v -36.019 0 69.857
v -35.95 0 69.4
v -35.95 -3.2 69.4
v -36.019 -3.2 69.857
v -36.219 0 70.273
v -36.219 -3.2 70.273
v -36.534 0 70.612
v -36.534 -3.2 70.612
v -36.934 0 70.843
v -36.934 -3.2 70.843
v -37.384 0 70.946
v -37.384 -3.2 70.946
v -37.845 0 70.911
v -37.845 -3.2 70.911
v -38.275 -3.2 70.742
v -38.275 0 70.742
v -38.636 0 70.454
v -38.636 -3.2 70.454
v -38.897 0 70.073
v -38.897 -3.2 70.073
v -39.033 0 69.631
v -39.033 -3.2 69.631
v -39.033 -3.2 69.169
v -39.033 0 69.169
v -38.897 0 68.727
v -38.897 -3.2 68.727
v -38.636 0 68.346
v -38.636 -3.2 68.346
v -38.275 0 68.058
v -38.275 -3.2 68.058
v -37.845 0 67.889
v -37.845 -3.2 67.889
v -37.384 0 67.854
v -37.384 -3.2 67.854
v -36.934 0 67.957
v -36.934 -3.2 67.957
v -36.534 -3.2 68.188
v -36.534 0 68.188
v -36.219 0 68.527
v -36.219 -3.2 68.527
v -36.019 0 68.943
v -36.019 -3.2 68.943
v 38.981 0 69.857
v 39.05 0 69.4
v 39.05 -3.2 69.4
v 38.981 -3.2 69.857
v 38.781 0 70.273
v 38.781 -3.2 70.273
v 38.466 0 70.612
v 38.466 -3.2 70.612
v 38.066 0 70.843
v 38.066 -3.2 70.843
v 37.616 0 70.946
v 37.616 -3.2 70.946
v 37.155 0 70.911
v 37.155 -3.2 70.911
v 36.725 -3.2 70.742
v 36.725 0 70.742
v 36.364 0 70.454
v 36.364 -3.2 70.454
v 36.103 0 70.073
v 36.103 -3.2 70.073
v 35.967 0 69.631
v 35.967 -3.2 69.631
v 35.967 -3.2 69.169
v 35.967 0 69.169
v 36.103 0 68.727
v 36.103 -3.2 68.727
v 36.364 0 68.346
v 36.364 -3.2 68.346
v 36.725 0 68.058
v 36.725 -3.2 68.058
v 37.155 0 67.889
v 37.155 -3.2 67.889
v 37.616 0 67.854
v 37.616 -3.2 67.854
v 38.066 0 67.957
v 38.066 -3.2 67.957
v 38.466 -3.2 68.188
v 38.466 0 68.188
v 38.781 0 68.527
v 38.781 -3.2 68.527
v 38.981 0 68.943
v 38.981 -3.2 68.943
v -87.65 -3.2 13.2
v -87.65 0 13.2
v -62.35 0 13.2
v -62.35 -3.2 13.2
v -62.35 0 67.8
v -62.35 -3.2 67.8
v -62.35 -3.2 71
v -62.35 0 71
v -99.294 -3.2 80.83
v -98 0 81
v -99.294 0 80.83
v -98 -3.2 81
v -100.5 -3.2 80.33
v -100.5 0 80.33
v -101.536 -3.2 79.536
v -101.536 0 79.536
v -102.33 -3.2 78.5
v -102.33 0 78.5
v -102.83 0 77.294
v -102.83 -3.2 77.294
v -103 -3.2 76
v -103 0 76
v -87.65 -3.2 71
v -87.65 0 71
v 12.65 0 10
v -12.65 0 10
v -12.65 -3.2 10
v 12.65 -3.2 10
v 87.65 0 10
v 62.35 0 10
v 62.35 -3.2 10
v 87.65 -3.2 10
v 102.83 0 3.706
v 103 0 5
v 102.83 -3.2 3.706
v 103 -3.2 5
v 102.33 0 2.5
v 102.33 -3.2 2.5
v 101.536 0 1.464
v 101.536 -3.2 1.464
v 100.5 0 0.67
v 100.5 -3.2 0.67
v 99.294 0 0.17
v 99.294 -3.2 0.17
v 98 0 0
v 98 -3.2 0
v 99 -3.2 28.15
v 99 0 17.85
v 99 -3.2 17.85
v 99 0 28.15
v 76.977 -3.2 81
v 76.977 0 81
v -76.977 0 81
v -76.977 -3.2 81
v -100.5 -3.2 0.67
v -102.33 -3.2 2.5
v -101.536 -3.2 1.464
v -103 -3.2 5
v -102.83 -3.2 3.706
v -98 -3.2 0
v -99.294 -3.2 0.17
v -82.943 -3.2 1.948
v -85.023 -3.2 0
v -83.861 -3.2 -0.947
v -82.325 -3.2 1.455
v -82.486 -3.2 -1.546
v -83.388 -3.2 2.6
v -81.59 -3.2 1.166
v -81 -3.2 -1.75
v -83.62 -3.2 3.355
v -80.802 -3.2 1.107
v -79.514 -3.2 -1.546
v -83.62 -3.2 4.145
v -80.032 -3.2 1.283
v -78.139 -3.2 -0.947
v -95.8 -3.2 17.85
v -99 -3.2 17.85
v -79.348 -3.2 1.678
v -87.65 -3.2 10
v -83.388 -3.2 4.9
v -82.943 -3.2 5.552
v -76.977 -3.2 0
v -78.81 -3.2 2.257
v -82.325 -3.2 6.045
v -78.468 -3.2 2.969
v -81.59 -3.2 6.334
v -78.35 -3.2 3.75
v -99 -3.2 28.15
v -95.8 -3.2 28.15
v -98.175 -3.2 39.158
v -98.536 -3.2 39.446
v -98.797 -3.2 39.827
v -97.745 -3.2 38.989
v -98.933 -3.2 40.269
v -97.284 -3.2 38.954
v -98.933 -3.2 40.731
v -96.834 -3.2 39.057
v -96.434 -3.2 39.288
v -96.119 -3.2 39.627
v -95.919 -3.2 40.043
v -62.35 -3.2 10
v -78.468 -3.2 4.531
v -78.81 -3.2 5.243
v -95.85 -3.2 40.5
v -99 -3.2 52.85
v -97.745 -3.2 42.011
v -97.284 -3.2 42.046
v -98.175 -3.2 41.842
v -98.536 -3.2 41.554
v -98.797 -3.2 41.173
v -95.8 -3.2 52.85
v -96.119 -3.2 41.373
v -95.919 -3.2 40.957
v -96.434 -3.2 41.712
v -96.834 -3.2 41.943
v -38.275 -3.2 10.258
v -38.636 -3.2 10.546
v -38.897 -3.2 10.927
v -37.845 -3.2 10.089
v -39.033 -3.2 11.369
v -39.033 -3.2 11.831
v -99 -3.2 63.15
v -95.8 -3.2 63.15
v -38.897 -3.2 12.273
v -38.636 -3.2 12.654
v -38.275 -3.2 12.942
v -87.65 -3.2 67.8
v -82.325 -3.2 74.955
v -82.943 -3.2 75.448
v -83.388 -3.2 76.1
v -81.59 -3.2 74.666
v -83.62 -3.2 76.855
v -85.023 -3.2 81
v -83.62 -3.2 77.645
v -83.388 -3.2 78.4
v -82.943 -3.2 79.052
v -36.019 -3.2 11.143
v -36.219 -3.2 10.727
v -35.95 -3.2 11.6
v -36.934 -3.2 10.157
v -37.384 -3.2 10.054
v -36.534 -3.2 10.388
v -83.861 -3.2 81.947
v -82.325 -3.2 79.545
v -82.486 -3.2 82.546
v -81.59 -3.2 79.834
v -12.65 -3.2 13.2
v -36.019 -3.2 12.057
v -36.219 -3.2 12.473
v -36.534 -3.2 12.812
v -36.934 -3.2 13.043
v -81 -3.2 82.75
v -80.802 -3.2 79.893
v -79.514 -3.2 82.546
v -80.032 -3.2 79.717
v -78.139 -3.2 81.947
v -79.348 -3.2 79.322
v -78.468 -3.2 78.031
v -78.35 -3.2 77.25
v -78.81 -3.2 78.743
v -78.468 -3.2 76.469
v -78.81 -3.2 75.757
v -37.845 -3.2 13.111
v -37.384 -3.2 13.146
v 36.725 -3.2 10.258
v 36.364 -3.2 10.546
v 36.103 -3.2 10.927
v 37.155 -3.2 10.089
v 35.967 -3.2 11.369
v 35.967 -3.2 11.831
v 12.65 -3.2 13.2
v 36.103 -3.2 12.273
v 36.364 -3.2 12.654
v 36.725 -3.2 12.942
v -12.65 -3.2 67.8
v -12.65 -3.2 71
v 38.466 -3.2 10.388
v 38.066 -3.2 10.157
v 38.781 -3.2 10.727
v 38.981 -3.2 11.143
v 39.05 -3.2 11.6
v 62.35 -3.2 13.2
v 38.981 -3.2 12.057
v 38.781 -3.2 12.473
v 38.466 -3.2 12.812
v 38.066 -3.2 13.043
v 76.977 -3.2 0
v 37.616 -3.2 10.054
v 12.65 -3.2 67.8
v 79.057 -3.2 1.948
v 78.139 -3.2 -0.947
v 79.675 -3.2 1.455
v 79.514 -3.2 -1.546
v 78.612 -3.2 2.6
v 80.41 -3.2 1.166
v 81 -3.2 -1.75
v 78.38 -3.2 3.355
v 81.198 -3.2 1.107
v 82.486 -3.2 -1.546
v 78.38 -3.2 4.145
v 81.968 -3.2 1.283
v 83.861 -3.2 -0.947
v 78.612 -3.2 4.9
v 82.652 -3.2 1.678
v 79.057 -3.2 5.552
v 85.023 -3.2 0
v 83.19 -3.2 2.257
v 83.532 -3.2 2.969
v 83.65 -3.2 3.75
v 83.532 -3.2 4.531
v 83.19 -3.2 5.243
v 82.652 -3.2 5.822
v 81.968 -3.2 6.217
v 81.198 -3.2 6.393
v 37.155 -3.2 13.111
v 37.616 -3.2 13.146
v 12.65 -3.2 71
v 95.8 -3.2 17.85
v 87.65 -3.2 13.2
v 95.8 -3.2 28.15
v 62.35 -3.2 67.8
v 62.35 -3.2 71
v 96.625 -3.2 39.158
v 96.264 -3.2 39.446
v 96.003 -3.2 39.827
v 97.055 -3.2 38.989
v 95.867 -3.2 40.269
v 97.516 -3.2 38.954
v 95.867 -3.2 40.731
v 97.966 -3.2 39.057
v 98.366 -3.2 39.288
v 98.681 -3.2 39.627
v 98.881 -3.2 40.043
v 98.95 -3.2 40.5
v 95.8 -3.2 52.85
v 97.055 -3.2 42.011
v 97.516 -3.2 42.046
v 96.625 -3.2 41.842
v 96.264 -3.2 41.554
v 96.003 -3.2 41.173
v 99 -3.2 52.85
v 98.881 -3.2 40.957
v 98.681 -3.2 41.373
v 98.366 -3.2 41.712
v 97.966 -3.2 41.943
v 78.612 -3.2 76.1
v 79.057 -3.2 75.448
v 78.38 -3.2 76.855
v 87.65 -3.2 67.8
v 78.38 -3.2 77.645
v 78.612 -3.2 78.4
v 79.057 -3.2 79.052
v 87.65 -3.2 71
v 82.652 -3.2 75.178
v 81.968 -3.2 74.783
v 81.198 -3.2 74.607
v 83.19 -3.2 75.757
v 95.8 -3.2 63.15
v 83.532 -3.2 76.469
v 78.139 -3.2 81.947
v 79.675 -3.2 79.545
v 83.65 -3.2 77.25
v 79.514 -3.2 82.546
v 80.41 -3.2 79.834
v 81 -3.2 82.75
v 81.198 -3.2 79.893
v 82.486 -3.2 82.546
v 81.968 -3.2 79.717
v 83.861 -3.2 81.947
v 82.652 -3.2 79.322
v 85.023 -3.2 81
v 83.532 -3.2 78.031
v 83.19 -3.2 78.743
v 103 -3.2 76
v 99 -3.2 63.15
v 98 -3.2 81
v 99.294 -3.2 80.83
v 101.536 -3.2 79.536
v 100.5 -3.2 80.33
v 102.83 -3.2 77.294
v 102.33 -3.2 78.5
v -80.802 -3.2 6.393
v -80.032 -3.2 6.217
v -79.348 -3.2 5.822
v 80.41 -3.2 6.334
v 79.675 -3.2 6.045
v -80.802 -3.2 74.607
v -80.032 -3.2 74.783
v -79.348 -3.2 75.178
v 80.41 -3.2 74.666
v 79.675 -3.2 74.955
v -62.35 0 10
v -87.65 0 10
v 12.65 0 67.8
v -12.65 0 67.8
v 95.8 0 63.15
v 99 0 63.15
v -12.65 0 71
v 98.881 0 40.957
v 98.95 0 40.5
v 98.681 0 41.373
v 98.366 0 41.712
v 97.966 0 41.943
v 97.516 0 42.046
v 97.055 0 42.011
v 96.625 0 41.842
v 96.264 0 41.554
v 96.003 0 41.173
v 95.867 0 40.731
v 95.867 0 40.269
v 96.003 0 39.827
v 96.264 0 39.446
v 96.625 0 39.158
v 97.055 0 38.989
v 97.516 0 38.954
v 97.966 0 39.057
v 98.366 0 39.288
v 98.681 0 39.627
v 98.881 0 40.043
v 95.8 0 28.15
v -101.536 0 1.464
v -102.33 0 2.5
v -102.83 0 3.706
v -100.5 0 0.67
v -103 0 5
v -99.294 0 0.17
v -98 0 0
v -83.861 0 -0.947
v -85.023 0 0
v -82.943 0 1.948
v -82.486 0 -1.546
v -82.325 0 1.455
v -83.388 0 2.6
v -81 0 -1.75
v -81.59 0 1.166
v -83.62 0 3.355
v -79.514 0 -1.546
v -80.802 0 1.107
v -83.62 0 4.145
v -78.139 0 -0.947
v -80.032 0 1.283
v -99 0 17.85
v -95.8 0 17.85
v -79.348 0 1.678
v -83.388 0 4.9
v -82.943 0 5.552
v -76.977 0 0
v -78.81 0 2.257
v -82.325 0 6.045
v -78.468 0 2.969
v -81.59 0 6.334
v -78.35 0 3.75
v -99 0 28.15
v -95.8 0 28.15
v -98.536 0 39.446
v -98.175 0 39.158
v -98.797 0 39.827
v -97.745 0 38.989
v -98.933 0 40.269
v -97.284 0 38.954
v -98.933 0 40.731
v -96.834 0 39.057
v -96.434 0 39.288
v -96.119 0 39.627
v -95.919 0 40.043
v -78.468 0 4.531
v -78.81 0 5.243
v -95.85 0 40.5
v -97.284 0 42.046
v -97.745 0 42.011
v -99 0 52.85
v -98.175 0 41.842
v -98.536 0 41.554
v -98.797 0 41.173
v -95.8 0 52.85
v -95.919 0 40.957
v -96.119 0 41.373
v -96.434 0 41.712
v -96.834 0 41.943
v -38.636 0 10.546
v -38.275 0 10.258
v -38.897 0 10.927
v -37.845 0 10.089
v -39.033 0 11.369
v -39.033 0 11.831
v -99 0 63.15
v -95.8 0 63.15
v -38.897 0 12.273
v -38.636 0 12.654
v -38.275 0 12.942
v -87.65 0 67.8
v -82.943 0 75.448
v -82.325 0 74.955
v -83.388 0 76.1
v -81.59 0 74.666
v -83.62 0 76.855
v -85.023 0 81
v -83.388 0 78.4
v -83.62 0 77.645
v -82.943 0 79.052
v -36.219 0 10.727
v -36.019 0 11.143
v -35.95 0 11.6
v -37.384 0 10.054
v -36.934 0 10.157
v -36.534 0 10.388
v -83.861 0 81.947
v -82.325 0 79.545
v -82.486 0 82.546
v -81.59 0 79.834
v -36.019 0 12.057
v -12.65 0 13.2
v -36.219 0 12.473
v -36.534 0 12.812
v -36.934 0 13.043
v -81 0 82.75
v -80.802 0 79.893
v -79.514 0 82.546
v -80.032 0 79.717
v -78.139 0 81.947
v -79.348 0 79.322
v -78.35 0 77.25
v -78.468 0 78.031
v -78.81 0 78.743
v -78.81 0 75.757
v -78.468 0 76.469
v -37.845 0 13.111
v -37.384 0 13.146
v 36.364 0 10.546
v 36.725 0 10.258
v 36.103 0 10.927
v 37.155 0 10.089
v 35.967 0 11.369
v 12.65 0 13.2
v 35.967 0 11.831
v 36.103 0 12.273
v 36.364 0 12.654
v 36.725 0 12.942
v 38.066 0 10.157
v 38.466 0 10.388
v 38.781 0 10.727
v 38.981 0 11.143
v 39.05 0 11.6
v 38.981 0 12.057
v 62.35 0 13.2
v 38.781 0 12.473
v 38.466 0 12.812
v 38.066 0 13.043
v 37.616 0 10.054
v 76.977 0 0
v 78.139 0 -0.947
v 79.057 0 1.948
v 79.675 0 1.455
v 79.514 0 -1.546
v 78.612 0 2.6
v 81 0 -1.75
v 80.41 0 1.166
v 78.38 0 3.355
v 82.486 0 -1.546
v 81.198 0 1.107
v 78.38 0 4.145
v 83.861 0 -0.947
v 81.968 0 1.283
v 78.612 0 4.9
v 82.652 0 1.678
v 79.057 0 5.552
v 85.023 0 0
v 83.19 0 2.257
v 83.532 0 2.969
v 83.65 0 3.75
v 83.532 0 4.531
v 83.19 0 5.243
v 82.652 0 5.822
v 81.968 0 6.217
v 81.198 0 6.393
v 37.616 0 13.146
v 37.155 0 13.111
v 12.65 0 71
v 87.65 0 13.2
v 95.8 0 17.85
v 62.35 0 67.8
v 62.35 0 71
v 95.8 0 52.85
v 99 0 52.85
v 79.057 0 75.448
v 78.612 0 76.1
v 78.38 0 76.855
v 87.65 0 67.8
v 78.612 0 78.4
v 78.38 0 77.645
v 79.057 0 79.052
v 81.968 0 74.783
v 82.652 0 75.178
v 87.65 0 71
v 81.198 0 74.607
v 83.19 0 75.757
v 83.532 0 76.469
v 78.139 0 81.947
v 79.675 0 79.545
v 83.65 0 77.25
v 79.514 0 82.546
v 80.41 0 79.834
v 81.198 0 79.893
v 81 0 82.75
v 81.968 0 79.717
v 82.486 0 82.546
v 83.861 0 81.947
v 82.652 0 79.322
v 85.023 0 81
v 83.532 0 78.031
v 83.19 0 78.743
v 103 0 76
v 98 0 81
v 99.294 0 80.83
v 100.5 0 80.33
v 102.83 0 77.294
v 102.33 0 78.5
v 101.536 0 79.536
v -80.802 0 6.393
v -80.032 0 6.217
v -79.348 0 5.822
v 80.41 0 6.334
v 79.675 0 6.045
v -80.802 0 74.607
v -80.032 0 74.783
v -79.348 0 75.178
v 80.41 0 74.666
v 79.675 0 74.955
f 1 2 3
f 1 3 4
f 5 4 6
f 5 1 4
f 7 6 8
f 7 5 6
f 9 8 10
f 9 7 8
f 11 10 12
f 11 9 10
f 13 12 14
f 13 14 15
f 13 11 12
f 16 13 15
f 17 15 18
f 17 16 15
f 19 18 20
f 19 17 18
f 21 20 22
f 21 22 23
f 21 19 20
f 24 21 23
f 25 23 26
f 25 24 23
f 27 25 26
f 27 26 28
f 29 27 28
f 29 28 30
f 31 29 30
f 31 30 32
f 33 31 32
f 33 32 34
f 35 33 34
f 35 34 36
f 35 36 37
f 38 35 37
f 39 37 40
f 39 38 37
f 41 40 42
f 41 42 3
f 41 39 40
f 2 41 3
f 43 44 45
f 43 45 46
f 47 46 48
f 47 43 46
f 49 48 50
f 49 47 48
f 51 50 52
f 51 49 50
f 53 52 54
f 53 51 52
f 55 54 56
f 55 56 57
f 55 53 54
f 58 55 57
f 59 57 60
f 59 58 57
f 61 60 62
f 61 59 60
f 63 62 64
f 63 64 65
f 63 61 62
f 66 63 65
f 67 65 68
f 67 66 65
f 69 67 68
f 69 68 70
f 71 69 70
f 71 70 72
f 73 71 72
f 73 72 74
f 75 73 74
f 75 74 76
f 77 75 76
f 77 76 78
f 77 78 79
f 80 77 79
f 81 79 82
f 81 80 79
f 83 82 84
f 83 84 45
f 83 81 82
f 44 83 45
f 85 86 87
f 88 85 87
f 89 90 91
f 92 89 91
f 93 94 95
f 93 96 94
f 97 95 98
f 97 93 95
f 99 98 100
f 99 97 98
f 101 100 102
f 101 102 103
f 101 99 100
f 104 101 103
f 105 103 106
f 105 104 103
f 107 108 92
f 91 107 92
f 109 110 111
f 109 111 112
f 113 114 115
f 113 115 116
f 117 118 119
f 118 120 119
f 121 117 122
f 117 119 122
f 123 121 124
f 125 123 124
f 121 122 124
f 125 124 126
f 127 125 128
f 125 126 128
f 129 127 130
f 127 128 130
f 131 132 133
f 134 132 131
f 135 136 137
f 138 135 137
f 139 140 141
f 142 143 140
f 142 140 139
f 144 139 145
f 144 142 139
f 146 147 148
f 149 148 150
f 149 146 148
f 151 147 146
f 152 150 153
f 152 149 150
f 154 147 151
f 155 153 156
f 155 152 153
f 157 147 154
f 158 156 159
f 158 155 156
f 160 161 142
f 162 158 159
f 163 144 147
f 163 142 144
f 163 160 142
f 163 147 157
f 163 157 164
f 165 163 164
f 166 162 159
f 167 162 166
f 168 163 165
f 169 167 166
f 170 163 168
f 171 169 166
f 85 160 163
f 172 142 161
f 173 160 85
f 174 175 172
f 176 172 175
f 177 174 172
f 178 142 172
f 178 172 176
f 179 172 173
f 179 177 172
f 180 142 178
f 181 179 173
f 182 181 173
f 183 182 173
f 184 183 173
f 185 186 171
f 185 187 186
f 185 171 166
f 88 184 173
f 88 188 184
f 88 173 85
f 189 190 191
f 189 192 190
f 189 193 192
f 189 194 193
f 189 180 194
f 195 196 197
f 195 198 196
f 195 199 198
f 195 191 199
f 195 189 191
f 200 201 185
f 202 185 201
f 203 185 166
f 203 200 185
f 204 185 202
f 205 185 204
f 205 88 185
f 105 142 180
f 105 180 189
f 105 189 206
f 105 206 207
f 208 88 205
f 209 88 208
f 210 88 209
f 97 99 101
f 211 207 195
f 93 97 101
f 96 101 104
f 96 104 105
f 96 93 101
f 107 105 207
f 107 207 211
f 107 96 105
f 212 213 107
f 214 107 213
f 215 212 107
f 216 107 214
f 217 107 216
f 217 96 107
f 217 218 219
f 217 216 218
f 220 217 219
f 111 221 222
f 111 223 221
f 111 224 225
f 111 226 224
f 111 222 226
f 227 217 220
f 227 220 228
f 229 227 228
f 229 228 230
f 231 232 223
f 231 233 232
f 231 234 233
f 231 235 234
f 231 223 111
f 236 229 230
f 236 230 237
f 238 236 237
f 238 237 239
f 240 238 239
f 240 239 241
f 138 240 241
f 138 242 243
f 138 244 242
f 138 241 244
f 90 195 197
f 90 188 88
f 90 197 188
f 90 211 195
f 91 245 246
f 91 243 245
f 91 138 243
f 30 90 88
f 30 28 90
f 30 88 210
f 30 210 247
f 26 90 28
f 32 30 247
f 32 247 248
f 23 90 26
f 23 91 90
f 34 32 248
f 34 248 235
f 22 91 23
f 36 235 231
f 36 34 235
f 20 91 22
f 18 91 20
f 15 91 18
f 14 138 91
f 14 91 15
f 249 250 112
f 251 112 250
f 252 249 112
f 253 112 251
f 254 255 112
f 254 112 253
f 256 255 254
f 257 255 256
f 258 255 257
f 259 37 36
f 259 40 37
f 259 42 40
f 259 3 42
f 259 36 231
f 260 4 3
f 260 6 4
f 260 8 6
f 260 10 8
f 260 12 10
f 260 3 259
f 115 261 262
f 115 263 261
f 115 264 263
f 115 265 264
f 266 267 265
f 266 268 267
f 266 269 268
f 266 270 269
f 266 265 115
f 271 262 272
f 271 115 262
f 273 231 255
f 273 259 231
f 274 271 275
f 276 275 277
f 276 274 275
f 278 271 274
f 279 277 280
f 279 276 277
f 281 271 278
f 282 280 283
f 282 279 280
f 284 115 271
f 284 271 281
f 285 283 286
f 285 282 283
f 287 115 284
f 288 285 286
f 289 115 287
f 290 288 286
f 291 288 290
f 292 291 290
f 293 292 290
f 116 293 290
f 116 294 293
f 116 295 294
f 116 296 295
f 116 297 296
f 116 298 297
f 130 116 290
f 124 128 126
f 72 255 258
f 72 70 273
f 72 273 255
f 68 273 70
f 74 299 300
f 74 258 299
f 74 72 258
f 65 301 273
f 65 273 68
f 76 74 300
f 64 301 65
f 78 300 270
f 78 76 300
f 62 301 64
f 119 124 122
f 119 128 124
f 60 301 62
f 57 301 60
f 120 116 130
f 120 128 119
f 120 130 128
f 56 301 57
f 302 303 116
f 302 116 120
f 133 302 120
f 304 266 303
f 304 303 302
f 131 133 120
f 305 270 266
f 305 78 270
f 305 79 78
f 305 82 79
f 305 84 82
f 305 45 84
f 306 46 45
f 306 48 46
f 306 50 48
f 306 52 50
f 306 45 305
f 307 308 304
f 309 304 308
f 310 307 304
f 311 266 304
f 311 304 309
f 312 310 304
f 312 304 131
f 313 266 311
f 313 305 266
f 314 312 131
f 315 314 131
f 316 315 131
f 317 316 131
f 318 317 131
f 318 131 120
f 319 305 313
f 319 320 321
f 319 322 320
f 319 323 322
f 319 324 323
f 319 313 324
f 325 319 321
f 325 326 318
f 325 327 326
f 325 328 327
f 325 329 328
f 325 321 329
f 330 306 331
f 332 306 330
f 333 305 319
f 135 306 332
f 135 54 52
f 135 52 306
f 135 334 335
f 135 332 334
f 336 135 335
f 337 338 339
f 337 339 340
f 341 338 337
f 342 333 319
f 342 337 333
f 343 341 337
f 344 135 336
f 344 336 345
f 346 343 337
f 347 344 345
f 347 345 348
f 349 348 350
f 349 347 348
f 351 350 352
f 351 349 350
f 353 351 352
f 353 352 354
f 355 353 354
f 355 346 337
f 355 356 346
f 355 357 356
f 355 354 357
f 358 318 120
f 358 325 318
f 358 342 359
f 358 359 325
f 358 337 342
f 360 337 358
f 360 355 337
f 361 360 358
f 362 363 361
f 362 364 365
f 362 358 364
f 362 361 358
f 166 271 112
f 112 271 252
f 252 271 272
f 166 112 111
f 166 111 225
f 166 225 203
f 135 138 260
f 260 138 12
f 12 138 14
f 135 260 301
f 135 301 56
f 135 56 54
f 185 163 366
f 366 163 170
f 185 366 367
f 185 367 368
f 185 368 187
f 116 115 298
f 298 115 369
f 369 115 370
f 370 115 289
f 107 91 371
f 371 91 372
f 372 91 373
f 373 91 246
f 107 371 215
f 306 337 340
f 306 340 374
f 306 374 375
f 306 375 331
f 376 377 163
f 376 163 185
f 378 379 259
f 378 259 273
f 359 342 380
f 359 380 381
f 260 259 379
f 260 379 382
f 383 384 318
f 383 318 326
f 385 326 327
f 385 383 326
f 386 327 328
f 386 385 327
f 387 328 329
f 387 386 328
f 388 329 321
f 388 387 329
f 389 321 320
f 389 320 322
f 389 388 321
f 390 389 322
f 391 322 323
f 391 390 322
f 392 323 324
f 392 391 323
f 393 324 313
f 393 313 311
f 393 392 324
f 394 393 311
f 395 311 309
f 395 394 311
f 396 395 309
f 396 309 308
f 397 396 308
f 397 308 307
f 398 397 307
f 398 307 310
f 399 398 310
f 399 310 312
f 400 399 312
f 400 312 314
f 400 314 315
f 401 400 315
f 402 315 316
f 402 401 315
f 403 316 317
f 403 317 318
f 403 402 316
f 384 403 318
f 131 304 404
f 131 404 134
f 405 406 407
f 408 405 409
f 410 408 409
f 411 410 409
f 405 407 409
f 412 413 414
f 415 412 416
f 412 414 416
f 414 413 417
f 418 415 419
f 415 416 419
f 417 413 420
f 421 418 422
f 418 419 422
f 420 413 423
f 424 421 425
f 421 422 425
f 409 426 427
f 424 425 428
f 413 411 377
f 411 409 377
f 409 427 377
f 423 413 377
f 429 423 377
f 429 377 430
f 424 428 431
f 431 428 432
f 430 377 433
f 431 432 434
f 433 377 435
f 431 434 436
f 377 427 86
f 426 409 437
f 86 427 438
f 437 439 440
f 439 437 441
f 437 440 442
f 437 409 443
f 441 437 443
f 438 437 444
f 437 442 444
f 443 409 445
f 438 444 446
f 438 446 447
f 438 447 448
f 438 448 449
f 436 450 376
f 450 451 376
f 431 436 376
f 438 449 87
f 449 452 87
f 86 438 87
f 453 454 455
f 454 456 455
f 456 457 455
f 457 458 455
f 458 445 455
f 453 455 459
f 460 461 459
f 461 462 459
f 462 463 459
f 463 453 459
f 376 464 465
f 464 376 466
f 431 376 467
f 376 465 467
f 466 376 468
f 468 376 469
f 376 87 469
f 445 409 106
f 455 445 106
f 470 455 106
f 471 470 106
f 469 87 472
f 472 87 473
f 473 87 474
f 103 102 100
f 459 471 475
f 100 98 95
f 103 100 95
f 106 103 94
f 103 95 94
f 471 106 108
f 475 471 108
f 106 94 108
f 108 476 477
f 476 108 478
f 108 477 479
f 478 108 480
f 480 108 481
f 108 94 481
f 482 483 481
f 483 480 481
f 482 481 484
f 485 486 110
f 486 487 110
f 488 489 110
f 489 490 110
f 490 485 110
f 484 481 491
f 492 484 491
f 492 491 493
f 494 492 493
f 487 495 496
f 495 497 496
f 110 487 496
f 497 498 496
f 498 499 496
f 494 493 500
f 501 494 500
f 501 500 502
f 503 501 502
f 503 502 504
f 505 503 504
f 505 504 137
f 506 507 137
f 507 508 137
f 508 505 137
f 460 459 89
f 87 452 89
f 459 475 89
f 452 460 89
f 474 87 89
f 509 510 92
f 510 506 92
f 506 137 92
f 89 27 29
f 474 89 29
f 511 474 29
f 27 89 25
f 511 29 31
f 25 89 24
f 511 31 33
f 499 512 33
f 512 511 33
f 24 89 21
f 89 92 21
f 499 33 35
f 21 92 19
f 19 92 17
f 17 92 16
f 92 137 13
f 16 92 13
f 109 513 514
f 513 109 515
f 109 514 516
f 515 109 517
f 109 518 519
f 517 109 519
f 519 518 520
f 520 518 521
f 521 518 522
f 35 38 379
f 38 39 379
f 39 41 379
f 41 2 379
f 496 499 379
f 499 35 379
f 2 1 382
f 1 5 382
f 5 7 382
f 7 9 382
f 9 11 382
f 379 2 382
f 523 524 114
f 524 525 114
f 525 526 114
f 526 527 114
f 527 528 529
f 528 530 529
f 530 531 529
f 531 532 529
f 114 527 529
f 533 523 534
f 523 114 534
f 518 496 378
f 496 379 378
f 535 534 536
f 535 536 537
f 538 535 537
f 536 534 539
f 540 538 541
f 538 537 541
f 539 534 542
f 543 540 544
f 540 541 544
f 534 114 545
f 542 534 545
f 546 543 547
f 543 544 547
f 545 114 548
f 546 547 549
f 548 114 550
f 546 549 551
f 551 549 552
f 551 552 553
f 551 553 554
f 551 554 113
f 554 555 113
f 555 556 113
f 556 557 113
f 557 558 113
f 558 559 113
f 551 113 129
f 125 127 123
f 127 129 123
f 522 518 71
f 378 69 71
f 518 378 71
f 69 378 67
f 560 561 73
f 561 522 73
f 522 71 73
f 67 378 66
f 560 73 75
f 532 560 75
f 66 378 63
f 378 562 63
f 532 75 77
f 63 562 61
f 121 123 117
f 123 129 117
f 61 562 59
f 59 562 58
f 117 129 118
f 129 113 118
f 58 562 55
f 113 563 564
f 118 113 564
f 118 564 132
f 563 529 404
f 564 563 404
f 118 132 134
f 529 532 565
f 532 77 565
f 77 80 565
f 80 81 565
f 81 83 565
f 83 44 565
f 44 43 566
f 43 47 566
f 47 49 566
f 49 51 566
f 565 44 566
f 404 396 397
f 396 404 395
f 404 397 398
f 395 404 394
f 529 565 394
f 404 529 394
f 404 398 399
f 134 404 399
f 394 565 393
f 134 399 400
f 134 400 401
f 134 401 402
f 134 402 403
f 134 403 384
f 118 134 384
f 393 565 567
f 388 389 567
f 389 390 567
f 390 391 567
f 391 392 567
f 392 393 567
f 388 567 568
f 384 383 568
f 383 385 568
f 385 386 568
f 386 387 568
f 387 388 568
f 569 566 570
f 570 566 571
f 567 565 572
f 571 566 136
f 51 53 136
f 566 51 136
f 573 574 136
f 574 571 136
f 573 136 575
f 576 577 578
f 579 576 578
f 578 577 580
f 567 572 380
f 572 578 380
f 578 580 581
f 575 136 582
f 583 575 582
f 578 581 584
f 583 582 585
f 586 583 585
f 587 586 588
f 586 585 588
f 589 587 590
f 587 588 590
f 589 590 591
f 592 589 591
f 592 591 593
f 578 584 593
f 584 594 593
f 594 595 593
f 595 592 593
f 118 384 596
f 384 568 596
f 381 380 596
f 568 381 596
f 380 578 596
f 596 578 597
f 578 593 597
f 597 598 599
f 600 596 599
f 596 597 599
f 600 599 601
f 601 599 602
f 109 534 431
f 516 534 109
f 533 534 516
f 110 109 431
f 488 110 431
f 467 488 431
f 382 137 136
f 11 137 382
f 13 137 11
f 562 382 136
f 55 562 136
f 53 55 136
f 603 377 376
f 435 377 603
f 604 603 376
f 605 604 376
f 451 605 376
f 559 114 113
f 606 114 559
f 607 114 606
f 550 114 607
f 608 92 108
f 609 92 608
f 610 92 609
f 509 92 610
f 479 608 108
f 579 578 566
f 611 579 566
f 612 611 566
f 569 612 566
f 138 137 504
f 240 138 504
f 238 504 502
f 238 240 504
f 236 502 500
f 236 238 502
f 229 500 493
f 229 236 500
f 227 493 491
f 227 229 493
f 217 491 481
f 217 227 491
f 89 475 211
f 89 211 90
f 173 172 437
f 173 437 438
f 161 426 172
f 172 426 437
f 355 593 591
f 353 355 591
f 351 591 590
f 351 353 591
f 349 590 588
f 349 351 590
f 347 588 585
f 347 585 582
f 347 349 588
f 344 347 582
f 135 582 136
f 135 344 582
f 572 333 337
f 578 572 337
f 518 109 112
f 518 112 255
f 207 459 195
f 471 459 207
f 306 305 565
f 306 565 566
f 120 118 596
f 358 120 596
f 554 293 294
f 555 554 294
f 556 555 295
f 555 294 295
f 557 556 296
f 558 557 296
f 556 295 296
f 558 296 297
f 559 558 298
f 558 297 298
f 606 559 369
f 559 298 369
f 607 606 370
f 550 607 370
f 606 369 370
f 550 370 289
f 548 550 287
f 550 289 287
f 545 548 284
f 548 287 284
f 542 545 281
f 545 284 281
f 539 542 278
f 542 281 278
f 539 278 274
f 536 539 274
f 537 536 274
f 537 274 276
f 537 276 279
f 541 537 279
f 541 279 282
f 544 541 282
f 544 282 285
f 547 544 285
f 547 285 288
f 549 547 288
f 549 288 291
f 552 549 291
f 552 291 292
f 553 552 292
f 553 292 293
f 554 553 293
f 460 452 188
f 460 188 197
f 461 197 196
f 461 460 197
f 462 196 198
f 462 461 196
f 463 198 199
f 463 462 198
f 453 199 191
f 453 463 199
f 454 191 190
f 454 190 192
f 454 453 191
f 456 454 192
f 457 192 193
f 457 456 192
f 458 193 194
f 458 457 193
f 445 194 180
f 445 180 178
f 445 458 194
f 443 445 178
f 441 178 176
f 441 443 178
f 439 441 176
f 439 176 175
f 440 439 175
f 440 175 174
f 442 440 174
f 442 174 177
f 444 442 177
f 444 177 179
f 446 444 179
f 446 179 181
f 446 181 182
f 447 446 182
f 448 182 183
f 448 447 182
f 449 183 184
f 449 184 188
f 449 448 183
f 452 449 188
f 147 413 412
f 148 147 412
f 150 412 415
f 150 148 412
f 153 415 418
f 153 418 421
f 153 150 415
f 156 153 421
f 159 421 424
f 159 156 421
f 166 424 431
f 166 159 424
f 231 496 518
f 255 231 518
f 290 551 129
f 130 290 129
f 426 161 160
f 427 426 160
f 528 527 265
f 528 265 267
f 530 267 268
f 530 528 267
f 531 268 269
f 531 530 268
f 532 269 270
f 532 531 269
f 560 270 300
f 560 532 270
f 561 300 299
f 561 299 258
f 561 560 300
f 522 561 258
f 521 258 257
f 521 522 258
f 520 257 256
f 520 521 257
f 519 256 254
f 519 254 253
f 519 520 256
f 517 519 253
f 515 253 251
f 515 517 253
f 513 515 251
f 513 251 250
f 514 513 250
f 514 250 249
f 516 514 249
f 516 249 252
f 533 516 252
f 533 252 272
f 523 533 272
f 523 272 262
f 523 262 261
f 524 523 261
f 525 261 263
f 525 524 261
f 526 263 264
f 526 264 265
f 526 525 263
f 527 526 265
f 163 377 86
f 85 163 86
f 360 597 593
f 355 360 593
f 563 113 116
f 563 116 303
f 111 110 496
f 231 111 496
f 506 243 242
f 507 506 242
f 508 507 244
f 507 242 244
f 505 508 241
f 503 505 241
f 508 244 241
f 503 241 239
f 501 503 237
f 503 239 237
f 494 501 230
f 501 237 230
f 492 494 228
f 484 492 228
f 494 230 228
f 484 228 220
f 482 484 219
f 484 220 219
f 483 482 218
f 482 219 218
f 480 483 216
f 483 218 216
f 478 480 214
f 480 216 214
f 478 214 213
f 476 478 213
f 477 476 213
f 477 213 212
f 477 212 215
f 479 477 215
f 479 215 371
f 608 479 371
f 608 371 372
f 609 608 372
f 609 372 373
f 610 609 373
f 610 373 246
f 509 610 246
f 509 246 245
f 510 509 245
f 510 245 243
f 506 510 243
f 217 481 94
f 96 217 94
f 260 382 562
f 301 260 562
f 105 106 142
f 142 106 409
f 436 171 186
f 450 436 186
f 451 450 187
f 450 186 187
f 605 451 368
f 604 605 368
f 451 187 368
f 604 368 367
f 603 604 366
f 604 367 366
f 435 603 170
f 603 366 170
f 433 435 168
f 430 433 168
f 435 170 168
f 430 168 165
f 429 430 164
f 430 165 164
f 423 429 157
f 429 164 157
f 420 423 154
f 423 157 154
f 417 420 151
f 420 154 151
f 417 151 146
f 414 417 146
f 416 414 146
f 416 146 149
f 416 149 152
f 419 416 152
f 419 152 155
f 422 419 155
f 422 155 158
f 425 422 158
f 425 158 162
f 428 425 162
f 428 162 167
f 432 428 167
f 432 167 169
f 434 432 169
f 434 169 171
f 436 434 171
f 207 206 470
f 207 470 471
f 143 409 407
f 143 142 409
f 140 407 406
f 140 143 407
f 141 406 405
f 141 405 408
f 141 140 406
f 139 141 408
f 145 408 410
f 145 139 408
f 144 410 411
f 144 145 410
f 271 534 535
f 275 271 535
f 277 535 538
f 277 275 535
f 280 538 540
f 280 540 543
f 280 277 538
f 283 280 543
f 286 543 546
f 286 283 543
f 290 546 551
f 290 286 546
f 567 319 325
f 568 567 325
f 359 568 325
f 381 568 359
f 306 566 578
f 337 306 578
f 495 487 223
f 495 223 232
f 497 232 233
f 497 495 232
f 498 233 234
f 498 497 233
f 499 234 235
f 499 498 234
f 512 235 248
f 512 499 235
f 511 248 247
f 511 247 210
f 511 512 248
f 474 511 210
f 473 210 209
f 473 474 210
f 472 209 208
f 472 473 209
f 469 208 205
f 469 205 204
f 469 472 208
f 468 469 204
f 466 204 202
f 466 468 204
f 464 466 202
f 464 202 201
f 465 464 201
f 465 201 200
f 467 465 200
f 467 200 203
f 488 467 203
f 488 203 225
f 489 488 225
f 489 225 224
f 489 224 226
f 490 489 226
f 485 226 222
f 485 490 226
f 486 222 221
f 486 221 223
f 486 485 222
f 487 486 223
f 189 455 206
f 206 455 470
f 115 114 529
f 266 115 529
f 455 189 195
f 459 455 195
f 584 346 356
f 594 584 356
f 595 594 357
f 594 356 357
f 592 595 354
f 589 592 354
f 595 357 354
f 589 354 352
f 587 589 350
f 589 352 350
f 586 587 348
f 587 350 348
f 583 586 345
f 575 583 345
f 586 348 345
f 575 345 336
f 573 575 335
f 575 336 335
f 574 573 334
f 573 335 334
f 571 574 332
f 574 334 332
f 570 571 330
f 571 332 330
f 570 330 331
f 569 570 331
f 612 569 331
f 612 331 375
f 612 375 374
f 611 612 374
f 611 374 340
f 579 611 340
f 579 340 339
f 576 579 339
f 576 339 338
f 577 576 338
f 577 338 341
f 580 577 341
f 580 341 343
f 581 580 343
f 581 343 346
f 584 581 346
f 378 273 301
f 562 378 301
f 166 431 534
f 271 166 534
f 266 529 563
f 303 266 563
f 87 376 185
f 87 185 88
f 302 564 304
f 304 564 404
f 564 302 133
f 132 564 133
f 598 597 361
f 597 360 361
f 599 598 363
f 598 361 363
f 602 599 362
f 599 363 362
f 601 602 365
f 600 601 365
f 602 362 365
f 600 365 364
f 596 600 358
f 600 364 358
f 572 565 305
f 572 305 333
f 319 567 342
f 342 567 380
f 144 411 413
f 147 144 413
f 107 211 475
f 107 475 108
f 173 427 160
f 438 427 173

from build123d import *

# Parameters (mm, degrees)
F1_W     = 25.3
F1_H     = 3.2
F1_R     = 1.55
F1_W_2   = 3.2
F1_H_2   = 10.3
F2_DEPTH = 3.2
F4_R     = 5.5
F5_DEPTH = 3.2
F3_R     = 2.65
F6_DEPTH = 3.201
F7_R     = 5


with BuildPart() as f2:
    # F1 (on Front) → F2 (new body)
    with BuildSketch(Plane.XZ):
        Polygon((-99, 81), (-103, 81), (-103, 0), (-99, 0), (99, 0), (103, 0), (103, 81), (99, 81), align=None)
        with Locations((-75, 11.6)):
            Rectangle(F1_W, F1_H, mode=Mode.SUBTRACT)
        with Locations((-37.5, 11.6)):
            Circle(F1_R, mode=Mode.SUBTRACT)
        with Locations((0, 11.6)):
            Rectangle(F1_W, F1_H, mode=Mode.SUBTRACT)
        with Locations((-97.4, 23)):
            Rectangle(F1_W_2, F1_H_2, mode=Mode.SUBTRACT)
        with Locations((37.5, 11.6)):
            Circle(F1_R, mode=Mode.SUBTRACT)
        with Locations((75, 11.6)):
            Rectangle(F1_W, F1_H, mode=Mode.SUBTRACT)
        with Locations((97.4, 23)):
            Rectangle(F1_W_2, F1_H_2, mode=Mode.SUBTRACT)
        with Locations((-97.4, 40.5)):
            Circle(F1_R, mode=Mode.SUBTRACT)
        with Locations((-97.4, 58)):
            Rectangle(F1_W_2, F1_H_2, mode=Mode.SUBTRACT)
        with Locations((-75, 69.4)):
            Rectangle(F1_W, F1_H, mode=Mode.SUBTRACT)
        with Locations((-37.5, 69.4)):
            Circle(F1_R, mode=Mode.SUBTRACT)
        with Locations((0, 69.4)):
            Rectangle(F1_W, F1_H, mode=Mode.SUBTRACT)
        with Locations((97.4, 40.5)):
            Circle(F1_R, mode=Mode.SUBTRACT)
        with Locations((97.4, 58)):
            Rectangle(F1_W_2, F1_H_2, mode=Mode.SUBTRACT)
        with Locations((37.5, 69.4)):
            Circle(F1_R, mode=Mode.SUBTRACT)
        with Locations((75, 69.4)):
            Rectangle(F1_W, F1_H, mode=Mode.SUBTRACT)
    extrude(amount=F2_DEPTH)

    # F4 (on face) → F5 (join, through all)
    with BuildSketch(Plane.XZ.offset(3.2)):
        with Locations((-81, 77.25)):
            Circle(F4_R)
        with Locations((81, 77.25)):
            Circle(F4_R)
        with Locations((81, 3.75)):
            Circle(F4_R)
        with Locations((-81, 3.75)):
            Circle(F4_R)
    extrude(amount=-F5_DEPTH)

    # F3 (on face) → F6 (cut, through all)
    with BuildSketch(Plane.XZ.offset(3.2)):
        with Locations((-81, 77.25)):
            Circle(F3_R)
        with Locations((-81, 3.75)):
            Circle(F3_R)
        with Locations((81, 3.75)):
            Circle(F3_R)
        with Locations((81, 77.25)):
            Circle(F3_R)
    extrude(amount=-F6_DEPTH, mode=Mode.SUBTRACT)

    # F7
    f7_edges = [f2.edges().sort_by_distance(p)[0] for p in [
        (-103, -1.6, 81),
        (-103, -1.6, 0),
        (103, -1.6, 0),
        (103, -1.6, 81),
    ]]
    fillet(f7_edges, radius=F7_R)


solid = f2.part
